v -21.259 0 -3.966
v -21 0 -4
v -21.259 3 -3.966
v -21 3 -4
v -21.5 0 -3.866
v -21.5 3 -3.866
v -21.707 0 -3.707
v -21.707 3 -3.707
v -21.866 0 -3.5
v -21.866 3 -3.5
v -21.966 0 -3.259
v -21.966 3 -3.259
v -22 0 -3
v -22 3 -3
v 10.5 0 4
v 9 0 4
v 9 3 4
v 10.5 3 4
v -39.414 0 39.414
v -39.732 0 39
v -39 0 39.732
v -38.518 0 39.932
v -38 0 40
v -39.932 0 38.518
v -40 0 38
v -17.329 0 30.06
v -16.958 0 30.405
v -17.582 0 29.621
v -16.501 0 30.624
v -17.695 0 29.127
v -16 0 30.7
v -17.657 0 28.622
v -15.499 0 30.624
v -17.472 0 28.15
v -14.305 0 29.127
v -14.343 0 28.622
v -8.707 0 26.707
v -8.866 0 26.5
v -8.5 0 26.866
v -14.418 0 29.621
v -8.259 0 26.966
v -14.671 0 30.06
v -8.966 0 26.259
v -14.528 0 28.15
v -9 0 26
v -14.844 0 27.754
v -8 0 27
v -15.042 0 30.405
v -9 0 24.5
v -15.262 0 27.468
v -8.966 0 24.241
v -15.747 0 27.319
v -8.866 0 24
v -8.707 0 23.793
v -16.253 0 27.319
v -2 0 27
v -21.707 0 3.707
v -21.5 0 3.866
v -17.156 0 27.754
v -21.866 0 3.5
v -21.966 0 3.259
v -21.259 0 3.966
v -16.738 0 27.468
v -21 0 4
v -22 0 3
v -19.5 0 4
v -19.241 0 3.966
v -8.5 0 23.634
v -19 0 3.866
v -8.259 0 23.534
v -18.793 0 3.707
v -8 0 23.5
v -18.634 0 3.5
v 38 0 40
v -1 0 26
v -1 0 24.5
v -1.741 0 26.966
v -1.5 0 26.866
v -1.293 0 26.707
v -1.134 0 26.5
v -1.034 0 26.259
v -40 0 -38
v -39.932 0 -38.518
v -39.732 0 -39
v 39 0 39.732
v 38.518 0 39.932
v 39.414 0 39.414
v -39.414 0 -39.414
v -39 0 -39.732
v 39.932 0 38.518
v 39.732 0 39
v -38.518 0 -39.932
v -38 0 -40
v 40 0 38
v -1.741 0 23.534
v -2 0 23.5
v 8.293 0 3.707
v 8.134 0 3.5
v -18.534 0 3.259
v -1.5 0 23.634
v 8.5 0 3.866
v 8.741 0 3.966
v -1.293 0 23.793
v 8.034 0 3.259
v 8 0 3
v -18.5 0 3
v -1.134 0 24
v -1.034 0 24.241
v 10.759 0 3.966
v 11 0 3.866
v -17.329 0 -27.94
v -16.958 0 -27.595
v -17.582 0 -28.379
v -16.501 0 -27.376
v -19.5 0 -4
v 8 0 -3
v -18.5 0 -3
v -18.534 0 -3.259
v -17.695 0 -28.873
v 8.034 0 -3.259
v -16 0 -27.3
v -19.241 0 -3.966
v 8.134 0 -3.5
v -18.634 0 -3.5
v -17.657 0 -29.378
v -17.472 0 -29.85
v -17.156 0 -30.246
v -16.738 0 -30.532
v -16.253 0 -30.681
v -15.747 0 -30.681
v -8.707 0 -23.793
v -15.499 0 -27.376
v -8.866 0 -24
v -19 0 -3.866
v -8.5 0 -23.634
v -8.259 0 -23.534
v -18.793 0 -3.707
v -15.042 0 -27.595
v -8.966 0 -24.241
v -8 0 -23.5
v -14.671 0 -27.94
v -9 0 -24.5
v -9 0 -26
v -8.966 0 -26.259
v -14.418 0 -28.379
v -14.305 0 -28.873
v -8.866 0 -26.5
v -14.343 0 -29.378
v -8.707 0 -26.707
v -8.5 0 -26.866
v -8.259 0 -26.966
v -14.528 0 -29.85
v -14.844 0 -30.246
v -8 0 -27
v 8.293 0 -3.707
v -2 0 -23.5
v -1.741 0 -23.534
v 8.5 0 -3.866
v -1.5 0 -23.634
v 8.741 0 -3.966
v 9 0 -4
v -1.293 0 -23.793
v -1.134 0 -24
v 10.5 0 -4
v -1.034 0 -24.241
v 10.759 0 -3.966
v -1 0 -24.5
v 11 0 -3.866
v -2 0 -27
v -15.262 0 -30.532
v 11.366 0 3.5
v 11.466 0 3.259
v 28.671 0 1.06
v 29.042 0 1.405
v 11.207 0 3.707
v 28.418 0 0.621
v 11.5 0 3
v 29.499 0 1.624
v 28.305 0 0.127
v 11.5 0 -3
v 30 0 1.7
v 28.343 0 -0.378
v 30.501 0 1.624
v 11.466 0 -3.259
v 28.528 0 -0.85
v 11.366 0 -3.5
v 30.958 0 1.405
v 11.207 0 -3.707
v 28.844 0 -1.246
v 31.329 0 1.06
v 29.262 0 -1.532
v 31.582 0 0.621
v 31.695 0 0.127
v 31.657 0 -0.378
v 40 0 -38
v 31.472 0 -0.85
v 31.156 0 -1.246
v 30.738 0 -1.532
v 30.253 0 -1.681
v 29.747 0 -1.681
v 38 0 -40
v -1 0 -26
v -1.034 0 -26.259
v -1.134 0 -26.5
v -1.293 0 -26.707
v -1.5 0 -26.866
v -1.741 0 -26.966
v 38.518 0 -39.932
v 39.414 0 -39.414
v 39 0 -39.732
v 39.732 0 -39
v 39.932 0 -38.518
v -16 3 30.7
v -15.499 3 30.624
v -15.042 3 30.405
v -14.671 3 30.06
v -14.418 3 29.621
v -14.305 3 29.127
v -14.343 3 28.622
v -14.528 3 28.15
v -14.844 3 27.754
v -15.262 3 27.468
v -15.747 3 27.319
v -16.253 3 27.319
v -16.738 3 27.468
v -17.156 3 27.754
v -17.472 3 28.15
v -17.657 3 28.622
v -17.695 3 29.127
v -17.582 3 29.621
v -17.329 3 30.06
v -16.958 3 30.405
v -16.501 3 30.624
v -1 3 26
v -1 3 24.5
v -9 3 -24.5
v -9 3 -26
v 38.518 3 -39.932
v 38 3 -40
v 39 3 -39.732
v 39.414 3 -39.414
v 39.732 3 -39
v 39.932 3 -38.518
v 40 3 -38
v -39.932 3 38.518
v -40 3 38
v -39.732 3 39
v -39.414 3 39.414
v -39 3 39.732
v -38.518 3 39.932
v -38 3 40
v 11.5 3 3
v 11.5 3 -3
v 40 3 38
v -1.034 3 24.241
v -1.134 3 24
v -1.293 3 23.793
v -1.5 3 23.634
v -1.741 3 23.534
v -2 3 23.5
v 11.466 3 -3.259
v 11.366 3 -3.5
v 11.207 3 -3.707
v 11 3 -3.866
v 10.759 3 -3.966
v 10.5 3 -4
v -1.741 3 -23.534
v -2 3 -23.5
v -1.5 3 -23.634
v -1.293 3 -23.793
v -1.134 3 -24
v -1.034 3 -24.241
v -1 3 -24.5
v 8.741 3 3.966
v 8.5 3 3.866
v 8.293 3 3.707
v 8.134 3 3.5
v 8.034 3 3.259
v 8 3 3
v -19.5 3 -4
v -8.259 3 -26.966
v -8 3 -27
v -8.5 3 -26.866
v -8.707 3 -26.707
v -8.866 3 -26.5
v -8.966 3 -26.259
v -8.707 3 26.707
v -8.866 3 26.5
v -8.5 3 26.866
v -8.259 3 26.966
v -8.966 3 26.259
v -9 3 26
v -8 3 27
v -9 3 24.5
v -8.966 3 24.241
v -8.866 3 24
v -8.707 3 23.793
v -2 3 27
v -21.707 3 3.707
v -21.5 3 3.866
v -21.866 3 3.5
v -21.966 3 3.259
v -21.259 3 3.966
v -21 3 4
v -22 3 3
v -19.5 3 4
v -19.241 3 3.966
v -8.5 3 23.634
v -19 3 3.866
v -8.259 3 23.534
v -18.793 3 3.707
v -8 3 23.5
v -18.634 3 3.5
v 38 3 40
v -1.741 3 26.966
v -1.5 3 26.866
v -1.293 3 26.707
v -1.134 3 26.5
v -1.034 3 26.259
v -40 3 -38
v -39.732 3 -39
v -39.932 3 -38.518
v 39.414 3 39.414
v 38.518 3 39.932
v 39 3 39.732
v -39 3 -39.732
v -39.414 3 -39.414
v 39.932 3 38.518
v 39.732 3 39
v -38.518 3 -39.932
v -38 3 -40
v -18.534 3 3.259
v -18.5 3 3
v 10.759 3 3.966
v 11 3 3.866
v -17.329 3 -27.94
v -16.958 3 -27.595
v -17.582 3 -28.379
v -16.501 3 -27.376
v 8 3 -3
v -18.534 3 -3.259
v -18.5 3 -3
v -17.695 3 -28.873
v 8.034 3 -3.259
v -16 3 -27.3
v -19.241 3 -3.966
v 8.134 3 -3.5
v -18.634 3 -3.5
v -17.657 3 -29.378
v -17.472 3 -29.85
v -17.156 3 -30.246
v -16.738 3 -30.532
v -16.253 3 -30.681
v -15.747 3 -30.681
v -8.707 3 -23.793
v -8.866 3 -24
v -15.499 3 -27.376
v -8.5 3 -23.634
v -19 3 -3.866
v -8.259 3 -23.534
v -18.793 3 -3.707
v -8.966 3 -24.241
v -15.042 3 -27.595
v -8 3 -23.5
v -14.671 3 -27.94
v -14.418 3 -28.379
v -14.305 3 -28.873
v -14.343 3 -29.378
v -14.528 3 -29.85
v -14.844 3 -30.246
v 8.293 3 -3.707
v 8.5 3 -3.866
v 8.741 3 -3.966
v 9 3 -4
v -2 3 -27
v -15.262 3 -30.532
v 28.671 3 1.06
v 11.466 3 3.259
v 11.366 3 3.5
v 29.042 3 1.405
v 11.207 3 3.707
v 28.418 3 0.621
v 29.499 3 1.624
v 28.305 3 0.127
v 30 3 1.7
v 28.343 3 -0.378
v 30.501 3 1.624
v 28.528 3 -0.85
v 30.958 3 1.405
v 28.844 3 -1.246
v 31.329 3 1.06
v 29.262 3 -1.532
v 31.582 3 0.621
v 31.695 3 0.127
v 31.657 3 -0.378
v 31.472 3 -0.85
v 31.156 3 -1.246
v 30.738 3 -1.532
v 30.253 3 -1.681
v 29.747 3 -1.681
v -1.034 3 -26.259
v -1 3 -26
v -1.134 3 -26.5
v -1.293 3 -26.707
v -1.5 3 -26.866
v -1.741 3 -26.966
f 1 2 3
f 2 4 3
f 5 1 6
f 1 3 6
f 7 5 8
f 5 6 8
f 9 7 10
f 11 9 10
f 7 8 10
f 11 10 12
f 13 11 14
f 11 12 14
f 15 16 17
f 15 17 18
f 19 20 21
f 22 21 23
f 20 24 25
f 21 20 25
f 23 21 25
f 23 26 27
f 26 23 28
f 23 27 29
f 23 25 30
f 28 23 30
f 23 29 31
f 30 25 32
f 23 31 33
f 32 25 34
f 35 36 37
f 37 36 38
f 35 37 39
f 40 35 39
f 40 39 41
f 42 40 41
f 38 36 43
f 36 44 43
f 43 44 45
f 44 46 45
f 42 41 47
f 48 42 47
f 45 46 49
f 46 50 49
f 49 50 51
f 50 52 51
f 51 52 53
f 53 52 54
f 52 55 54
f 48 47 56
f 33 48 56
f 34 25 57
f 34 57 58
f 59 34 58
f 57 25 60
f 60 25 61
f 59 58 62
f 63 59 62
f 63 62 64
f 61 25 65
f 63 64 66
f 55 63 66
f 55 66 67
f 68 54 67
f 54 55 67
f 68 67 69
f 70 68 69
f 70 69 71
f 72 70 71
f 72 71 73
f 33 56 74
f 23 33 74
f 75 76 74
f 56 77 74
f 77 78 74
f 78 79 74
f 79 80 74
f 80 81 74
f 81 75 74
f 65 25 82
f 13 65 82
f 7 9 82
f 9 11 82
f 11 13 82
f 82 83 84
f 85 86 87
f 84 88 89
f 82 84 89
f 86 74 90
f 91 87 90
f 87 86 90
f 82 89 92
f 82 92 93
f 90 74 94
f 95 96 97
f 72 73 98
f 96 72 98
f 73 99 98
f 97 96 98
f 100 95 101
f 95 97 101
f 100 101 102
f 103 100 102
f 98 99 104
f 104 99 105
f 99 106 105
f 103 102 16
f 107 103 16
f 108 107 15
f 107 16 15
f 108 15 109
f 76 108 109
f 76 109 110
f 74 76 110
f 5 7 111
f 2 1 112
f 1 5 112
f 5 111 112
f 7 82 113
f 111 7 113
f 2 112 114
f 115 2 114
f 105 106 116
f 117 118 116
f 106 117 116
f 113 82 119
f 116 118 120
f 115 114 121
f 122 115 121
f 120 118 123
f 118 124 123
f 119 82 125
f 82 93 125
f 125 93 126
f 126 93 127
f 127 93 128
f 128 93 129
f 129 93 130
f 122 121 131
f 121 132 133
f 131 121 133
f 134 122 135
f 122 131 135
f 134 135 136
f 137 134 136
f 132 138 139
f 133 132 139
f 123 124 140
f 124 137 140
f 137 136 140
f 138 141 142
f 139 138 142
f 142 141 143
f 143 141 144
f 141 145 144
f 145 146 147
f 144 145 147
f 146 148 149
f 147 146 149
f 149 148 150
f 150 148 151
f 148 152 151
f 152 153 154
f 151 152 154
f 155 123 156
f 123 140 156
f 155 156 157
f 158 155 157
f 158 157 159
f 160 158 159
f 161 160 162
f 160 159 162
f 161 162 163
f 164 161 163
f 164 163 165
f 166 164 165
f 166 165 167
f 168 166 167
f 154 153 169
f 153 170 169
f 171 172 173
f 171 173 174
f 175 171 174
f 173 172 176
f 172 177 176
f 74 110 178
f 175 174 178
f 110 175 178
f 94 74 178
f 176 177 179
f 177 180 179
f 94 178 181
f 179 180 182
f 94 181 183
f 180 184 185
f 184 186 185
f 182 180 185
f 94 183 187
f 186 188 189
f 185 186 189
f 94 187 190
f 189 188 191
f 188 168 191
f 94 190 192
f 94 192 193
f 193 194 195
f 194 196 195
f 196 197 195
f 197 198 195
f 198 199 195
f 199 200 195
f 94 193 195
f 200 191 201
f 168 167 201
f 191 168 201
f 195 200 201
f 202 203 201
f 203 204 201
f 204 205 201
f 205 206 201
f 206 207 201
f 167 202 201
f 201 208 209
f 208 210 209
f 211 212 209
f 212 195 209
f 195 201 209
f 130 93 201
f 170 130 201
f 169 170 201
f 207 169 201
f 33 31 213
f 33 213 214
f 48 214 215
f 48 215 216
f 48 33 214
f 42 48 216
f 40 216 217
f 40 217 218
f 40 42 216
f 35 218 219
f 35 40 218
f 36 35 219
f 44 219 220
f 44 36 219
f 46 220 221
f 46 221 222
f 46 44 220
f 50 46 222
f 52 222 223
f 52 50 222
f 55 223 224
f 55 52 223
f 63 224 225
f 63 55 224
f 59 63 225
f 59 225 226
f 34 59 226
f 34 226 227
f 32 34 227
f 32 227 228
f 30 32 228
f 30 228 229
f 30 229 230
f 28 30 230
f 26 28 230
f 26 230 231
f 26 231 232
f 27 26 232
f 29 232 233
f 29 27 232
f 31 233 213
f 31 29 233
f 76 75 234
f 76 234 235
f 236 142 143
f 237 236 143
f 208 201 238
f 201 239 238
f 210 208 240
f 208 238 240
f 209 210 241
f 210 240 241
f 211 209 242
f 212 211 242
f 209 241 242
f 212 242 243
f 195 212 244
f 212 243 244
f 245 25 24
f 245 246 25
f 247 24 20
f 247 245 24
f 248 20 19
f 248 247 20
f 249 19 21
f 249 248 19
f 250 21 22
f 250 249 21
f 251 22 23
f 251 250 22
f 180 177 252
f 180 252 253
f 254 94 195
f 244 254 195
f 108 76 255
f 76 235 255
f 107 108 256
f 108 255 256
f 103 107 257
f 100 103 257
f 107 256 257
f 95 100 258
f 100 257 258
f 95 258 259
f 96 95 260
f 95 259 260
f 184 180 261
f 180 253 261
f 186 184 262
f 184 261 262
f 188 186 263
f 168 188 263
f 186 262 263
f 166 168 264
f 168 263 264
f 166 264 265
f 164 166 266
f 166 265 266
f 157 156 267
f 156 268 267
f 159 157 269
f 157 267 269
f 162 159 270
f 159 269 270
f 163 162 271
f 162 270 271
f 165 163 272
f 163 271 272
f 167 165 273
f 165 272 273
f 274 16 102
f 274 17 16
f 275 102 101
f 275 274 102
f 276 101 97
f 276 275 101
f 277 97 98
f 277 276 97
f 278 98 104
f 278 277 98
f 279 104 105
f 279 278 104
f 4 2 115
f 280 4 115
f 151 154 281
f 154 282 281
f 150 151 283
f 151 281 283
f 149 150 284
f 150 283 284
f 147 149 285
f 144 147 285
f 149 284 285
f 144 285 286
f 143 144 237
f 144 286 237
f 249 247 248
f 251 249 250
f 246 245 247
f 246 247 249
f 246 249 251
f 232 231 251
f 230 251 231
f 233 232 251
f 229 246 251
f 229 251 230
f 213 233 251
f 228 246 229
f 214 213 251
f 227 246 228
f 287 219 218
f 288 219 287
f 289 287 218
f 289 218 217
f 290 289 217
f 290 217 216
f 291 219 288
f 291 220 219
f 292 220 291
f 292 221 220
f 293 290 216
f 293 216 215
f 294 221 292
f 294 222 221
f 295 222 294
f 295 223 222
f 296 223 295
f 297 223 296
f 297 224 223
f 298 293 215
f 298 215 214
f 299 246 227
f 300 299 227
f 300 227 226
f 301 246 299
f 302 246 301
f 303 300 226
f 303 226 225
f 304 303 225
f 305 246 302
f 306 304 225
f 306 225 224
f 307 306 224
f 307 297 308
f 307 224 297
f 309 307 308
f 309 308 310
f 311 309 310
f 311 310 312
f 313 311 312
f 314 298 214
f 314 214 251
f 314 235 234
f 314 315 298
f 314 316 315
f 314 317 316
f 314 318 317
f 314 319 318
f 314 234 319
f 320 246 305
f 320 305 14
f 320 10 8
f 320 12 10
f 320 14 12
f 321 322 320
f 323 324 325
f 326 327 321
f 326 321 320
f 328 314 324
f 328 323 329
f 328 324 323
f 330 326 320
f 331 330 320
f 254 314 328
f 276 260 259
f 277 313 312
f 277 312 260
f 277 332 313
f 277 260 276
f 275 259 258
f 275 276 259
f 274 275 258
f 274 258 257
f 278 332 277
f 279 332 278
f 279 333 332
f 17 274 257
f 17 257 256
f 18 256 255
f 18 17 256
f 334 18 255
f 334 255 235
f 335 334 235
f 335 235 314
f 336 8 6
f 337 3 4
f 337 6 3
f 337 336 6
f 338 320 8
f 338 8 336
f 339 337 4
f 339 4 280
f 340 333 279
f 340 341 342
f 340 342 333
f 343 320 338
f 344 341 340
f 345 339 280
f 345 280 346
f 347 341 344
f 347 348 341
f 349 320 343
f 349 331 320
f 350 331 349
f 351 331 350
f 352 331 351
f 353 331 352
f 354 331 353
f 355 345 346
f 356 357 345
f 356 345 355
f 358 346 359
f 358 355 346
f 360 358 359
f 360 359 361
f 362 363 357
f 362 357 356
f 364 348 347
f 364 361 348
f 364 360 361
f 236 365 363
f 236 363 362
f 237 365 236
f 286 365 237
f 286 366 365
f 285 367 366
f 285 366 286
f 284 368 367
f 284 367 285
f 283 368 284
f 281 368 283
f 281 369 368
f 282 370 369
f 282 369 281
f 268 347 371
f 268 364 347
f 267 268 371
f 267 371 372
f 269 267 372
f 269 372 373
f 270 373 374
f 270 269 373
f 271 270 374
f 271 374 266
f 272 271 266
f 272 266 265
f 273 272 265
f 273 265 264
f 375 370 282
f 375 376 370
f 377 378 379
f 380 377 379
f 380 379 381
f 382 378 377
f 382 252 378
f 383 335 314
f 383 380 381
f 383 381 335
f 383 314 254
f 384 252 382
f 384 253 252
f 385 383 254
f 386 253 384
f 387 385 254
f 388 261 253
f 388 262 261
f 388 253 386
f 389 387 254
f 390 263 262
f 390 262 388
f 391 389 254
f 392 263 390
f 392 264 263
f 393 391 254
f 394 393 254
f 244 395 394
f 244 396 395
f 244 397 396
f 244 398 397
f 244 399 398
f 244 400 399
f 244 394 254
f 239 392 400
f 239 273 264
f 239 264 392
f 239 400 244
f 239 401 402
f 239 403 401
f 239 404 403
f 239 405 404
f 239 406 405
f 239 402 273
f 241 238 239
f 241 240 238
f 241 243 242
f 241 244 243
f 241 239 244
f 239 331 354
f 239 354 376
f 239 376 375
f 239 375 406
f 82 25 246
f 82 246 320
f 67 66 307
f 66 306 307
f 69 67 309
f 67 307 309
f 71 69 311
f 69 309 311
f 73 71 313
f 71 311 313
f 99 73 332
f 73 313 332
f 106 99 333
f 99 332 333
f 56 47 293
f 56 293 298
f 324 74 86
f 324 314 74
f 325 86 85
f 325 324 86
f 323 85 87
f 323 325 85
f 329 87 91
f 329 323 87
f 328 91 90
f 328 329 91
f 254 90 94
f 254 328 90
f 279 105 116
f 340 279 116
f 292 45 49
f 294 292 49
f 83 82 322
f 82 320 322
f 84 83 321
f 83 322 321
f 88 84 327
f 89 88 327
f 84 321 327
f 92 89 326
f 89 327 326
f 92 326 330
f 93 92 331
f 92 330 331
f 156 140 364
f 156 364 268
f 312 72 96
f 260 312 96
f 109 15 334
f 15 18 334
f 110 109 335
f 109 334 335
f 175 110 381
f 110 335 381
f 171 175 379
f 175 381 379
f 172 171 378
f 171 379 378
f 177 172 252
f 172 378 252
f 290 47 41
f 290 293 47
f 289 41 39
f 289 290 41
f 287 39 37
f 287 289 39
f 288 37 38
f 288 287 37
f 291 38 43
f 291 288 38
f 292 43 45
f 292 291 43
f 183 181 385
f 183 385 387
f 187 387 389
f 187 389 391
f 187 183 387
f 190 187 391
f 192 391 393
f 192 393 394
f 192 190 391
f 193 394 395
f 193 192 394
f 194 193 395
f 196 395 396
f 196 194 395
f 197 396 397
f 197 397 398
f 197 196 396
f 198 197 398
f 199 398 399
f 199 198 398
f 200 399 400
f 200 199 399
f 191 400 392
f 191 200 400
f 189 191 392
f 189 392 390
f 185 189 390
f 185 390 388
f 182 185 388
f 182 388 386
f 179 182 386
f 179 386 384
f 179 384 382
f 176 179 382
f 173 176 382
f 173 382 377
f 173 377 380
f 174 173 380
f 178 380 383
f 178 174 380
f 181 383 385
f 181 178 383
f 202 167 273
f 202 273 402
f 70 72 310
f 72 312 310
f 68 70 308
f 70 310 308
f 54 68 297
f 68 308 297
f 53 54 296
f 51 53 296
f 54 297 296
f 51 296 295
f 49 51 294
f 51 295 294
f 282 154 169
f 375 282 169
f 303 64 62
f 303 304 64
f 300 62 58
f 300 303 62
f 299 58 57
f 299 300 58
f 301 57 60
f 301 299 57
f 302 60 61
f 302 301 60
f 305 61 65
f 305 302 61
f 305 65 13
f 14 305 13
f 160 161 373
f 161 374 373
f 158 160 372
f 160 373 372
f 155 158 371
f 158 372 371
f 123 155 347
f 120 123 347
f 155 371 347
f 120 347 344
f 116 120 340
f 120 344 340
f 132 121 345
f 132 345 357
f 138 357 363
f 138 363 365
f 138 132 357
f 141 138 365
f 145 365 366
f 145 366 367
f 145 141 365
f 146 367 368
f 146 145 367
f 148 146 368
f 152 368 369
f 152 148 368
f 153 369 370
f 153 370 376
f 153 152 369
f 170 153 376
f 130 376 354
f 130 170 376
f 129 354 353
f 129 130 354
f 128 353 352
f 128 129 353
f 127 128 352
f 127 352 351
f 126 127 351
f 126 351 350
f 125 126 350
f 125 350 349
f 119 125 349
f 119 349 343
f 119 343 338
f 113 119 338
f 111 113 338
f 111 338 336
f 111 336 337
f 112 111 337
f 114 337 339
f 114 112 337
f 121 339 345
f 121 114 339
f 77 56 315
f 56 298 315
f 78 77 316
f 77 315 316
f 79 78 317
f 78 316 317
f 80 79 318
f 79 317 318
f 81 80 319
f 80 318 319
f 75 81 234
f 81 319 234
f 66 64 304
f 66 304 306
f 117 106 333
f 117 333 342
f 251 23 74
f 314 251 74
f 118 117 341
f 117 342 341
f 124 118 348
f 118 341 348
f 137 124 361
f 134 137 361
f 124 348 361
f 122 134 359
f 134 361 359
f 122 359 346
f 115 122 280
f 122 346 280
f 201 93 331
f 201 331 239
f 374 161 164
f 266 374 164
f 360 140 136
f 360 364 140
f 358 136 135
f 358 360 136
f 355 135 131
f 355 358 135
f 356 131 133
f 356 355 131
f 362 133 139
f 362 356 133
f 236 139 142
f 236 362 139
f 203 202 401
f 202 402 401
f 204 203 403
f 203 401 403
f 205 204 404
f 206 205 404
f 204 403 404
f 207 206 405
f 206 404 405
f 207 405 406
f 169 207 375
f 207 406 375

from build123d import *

# Parameters (mm, degrees)
SKETCH1_W           = 80
SKETCH1_H           = 80
BOSS_EXTRUDE1_DEPTH = 3
SKETCH5_R           = 1.7
SKETCH5_W           = 3.5
SKETCH5_H           = 8
SKETCH5_W_2         = 8
SKETCH5_H_2         = 3.5
CUT_EXTRUDE5_DEPTH  = 3
FILLET1_R           = 1
FILLET2_R           = 1
FILLET3_R           = 2


with BuildPart() as part:
    # Sketch1 → Boss-Extrude1 (new body)
    with BuildSketch(Plane(origin=(0, 0, 0), x_dir=(1, 0, 0), z_dir=(0, 1, 0))):
        Rectangle(SKETCH1_W, SKETCH1_H)
    extrude(amount=BOSS_EXTRUDE1_DEPTH)

    # Sketch5 → Cut-Extrude5 (cut)
    with BuildSketch(Plane(origin=(0, 0, 0), x_dir=(1, 0, 0), z_dir=(0, 1, 0))):
        with Locations(Location((30, 0, 0), (0, 0, 270))):
            Circle(SKETCH5_R)
        with Locations(Location((-16, 29, 0), (0, 0, 270))):
            Circle(SKETCH5_R)
        with Locations(Location((-16, -29, 0), (0, 0, 270))):
            Circle(SKETCH5_R)
        with Locations((9.75, 0)):
            Rectangle(SKETCH5_W, SKETCH5_H)
        with Locations((-20.25, 0)):
            Rectangle(SKETCH5_W, SKETCH5_H)
        with Locations((-5, 25.25)):
            Rectangle(SKETCH5_W_2, SKETCH5_H_2)
        with Locations((-5, -25.25)):
            Rectangle(SKETCH5_W_2, SKETCH5_H_2)
    extrude(amount=CUT_EXTRUDE5_DEPTH, mode=Mode.SUBTRACT)

    # Fillet1
    fillet1_edges = [part.edges().sort_by_distance(p)[0] for p in [
        (11.5, 1.5, 4),
        (11.5, 1.5, -4),
        (8, 1.5, -4),
        (8, 1.5, 4),
    ]]
    fillet(fillet1_edges, radius=FILLET1_R)

    # Fillet2
    fillet2_edges = [part.edges().sort_by_distance(p)[0] for p in [
        (-1, 1.5, 27),
        (-1, 1.5, 23.5),
        (-9, 1.5, 23.5),
        (-9, 1.5, 27),
        (-1, 1.5, -23.5),
        (-1, 1.5, -27),
        (-9, 1.5, -27),
        (-9, 1.5, -23.5),
        (-18.5, 1.5, 4),
        (-18.5, 1.5, -4),
        (-22, 1.5, -4),
        (-22, 1.5, 4),
    ]]
    fillet(fillet2_edges, radius=FILLET2_R)

    # Fillet3
    fillet3_edges = [part.edges().sort_by_distance(p)[0] for p in [
        (40, 1.5, 40),
        (-40, 1.5, 40),
        (-40, 1.5, -40),
        (40, 1.5, -40),
    ]]
    fillet(fillet3_edges, radius=FILLET3_R)


solid = part.part
